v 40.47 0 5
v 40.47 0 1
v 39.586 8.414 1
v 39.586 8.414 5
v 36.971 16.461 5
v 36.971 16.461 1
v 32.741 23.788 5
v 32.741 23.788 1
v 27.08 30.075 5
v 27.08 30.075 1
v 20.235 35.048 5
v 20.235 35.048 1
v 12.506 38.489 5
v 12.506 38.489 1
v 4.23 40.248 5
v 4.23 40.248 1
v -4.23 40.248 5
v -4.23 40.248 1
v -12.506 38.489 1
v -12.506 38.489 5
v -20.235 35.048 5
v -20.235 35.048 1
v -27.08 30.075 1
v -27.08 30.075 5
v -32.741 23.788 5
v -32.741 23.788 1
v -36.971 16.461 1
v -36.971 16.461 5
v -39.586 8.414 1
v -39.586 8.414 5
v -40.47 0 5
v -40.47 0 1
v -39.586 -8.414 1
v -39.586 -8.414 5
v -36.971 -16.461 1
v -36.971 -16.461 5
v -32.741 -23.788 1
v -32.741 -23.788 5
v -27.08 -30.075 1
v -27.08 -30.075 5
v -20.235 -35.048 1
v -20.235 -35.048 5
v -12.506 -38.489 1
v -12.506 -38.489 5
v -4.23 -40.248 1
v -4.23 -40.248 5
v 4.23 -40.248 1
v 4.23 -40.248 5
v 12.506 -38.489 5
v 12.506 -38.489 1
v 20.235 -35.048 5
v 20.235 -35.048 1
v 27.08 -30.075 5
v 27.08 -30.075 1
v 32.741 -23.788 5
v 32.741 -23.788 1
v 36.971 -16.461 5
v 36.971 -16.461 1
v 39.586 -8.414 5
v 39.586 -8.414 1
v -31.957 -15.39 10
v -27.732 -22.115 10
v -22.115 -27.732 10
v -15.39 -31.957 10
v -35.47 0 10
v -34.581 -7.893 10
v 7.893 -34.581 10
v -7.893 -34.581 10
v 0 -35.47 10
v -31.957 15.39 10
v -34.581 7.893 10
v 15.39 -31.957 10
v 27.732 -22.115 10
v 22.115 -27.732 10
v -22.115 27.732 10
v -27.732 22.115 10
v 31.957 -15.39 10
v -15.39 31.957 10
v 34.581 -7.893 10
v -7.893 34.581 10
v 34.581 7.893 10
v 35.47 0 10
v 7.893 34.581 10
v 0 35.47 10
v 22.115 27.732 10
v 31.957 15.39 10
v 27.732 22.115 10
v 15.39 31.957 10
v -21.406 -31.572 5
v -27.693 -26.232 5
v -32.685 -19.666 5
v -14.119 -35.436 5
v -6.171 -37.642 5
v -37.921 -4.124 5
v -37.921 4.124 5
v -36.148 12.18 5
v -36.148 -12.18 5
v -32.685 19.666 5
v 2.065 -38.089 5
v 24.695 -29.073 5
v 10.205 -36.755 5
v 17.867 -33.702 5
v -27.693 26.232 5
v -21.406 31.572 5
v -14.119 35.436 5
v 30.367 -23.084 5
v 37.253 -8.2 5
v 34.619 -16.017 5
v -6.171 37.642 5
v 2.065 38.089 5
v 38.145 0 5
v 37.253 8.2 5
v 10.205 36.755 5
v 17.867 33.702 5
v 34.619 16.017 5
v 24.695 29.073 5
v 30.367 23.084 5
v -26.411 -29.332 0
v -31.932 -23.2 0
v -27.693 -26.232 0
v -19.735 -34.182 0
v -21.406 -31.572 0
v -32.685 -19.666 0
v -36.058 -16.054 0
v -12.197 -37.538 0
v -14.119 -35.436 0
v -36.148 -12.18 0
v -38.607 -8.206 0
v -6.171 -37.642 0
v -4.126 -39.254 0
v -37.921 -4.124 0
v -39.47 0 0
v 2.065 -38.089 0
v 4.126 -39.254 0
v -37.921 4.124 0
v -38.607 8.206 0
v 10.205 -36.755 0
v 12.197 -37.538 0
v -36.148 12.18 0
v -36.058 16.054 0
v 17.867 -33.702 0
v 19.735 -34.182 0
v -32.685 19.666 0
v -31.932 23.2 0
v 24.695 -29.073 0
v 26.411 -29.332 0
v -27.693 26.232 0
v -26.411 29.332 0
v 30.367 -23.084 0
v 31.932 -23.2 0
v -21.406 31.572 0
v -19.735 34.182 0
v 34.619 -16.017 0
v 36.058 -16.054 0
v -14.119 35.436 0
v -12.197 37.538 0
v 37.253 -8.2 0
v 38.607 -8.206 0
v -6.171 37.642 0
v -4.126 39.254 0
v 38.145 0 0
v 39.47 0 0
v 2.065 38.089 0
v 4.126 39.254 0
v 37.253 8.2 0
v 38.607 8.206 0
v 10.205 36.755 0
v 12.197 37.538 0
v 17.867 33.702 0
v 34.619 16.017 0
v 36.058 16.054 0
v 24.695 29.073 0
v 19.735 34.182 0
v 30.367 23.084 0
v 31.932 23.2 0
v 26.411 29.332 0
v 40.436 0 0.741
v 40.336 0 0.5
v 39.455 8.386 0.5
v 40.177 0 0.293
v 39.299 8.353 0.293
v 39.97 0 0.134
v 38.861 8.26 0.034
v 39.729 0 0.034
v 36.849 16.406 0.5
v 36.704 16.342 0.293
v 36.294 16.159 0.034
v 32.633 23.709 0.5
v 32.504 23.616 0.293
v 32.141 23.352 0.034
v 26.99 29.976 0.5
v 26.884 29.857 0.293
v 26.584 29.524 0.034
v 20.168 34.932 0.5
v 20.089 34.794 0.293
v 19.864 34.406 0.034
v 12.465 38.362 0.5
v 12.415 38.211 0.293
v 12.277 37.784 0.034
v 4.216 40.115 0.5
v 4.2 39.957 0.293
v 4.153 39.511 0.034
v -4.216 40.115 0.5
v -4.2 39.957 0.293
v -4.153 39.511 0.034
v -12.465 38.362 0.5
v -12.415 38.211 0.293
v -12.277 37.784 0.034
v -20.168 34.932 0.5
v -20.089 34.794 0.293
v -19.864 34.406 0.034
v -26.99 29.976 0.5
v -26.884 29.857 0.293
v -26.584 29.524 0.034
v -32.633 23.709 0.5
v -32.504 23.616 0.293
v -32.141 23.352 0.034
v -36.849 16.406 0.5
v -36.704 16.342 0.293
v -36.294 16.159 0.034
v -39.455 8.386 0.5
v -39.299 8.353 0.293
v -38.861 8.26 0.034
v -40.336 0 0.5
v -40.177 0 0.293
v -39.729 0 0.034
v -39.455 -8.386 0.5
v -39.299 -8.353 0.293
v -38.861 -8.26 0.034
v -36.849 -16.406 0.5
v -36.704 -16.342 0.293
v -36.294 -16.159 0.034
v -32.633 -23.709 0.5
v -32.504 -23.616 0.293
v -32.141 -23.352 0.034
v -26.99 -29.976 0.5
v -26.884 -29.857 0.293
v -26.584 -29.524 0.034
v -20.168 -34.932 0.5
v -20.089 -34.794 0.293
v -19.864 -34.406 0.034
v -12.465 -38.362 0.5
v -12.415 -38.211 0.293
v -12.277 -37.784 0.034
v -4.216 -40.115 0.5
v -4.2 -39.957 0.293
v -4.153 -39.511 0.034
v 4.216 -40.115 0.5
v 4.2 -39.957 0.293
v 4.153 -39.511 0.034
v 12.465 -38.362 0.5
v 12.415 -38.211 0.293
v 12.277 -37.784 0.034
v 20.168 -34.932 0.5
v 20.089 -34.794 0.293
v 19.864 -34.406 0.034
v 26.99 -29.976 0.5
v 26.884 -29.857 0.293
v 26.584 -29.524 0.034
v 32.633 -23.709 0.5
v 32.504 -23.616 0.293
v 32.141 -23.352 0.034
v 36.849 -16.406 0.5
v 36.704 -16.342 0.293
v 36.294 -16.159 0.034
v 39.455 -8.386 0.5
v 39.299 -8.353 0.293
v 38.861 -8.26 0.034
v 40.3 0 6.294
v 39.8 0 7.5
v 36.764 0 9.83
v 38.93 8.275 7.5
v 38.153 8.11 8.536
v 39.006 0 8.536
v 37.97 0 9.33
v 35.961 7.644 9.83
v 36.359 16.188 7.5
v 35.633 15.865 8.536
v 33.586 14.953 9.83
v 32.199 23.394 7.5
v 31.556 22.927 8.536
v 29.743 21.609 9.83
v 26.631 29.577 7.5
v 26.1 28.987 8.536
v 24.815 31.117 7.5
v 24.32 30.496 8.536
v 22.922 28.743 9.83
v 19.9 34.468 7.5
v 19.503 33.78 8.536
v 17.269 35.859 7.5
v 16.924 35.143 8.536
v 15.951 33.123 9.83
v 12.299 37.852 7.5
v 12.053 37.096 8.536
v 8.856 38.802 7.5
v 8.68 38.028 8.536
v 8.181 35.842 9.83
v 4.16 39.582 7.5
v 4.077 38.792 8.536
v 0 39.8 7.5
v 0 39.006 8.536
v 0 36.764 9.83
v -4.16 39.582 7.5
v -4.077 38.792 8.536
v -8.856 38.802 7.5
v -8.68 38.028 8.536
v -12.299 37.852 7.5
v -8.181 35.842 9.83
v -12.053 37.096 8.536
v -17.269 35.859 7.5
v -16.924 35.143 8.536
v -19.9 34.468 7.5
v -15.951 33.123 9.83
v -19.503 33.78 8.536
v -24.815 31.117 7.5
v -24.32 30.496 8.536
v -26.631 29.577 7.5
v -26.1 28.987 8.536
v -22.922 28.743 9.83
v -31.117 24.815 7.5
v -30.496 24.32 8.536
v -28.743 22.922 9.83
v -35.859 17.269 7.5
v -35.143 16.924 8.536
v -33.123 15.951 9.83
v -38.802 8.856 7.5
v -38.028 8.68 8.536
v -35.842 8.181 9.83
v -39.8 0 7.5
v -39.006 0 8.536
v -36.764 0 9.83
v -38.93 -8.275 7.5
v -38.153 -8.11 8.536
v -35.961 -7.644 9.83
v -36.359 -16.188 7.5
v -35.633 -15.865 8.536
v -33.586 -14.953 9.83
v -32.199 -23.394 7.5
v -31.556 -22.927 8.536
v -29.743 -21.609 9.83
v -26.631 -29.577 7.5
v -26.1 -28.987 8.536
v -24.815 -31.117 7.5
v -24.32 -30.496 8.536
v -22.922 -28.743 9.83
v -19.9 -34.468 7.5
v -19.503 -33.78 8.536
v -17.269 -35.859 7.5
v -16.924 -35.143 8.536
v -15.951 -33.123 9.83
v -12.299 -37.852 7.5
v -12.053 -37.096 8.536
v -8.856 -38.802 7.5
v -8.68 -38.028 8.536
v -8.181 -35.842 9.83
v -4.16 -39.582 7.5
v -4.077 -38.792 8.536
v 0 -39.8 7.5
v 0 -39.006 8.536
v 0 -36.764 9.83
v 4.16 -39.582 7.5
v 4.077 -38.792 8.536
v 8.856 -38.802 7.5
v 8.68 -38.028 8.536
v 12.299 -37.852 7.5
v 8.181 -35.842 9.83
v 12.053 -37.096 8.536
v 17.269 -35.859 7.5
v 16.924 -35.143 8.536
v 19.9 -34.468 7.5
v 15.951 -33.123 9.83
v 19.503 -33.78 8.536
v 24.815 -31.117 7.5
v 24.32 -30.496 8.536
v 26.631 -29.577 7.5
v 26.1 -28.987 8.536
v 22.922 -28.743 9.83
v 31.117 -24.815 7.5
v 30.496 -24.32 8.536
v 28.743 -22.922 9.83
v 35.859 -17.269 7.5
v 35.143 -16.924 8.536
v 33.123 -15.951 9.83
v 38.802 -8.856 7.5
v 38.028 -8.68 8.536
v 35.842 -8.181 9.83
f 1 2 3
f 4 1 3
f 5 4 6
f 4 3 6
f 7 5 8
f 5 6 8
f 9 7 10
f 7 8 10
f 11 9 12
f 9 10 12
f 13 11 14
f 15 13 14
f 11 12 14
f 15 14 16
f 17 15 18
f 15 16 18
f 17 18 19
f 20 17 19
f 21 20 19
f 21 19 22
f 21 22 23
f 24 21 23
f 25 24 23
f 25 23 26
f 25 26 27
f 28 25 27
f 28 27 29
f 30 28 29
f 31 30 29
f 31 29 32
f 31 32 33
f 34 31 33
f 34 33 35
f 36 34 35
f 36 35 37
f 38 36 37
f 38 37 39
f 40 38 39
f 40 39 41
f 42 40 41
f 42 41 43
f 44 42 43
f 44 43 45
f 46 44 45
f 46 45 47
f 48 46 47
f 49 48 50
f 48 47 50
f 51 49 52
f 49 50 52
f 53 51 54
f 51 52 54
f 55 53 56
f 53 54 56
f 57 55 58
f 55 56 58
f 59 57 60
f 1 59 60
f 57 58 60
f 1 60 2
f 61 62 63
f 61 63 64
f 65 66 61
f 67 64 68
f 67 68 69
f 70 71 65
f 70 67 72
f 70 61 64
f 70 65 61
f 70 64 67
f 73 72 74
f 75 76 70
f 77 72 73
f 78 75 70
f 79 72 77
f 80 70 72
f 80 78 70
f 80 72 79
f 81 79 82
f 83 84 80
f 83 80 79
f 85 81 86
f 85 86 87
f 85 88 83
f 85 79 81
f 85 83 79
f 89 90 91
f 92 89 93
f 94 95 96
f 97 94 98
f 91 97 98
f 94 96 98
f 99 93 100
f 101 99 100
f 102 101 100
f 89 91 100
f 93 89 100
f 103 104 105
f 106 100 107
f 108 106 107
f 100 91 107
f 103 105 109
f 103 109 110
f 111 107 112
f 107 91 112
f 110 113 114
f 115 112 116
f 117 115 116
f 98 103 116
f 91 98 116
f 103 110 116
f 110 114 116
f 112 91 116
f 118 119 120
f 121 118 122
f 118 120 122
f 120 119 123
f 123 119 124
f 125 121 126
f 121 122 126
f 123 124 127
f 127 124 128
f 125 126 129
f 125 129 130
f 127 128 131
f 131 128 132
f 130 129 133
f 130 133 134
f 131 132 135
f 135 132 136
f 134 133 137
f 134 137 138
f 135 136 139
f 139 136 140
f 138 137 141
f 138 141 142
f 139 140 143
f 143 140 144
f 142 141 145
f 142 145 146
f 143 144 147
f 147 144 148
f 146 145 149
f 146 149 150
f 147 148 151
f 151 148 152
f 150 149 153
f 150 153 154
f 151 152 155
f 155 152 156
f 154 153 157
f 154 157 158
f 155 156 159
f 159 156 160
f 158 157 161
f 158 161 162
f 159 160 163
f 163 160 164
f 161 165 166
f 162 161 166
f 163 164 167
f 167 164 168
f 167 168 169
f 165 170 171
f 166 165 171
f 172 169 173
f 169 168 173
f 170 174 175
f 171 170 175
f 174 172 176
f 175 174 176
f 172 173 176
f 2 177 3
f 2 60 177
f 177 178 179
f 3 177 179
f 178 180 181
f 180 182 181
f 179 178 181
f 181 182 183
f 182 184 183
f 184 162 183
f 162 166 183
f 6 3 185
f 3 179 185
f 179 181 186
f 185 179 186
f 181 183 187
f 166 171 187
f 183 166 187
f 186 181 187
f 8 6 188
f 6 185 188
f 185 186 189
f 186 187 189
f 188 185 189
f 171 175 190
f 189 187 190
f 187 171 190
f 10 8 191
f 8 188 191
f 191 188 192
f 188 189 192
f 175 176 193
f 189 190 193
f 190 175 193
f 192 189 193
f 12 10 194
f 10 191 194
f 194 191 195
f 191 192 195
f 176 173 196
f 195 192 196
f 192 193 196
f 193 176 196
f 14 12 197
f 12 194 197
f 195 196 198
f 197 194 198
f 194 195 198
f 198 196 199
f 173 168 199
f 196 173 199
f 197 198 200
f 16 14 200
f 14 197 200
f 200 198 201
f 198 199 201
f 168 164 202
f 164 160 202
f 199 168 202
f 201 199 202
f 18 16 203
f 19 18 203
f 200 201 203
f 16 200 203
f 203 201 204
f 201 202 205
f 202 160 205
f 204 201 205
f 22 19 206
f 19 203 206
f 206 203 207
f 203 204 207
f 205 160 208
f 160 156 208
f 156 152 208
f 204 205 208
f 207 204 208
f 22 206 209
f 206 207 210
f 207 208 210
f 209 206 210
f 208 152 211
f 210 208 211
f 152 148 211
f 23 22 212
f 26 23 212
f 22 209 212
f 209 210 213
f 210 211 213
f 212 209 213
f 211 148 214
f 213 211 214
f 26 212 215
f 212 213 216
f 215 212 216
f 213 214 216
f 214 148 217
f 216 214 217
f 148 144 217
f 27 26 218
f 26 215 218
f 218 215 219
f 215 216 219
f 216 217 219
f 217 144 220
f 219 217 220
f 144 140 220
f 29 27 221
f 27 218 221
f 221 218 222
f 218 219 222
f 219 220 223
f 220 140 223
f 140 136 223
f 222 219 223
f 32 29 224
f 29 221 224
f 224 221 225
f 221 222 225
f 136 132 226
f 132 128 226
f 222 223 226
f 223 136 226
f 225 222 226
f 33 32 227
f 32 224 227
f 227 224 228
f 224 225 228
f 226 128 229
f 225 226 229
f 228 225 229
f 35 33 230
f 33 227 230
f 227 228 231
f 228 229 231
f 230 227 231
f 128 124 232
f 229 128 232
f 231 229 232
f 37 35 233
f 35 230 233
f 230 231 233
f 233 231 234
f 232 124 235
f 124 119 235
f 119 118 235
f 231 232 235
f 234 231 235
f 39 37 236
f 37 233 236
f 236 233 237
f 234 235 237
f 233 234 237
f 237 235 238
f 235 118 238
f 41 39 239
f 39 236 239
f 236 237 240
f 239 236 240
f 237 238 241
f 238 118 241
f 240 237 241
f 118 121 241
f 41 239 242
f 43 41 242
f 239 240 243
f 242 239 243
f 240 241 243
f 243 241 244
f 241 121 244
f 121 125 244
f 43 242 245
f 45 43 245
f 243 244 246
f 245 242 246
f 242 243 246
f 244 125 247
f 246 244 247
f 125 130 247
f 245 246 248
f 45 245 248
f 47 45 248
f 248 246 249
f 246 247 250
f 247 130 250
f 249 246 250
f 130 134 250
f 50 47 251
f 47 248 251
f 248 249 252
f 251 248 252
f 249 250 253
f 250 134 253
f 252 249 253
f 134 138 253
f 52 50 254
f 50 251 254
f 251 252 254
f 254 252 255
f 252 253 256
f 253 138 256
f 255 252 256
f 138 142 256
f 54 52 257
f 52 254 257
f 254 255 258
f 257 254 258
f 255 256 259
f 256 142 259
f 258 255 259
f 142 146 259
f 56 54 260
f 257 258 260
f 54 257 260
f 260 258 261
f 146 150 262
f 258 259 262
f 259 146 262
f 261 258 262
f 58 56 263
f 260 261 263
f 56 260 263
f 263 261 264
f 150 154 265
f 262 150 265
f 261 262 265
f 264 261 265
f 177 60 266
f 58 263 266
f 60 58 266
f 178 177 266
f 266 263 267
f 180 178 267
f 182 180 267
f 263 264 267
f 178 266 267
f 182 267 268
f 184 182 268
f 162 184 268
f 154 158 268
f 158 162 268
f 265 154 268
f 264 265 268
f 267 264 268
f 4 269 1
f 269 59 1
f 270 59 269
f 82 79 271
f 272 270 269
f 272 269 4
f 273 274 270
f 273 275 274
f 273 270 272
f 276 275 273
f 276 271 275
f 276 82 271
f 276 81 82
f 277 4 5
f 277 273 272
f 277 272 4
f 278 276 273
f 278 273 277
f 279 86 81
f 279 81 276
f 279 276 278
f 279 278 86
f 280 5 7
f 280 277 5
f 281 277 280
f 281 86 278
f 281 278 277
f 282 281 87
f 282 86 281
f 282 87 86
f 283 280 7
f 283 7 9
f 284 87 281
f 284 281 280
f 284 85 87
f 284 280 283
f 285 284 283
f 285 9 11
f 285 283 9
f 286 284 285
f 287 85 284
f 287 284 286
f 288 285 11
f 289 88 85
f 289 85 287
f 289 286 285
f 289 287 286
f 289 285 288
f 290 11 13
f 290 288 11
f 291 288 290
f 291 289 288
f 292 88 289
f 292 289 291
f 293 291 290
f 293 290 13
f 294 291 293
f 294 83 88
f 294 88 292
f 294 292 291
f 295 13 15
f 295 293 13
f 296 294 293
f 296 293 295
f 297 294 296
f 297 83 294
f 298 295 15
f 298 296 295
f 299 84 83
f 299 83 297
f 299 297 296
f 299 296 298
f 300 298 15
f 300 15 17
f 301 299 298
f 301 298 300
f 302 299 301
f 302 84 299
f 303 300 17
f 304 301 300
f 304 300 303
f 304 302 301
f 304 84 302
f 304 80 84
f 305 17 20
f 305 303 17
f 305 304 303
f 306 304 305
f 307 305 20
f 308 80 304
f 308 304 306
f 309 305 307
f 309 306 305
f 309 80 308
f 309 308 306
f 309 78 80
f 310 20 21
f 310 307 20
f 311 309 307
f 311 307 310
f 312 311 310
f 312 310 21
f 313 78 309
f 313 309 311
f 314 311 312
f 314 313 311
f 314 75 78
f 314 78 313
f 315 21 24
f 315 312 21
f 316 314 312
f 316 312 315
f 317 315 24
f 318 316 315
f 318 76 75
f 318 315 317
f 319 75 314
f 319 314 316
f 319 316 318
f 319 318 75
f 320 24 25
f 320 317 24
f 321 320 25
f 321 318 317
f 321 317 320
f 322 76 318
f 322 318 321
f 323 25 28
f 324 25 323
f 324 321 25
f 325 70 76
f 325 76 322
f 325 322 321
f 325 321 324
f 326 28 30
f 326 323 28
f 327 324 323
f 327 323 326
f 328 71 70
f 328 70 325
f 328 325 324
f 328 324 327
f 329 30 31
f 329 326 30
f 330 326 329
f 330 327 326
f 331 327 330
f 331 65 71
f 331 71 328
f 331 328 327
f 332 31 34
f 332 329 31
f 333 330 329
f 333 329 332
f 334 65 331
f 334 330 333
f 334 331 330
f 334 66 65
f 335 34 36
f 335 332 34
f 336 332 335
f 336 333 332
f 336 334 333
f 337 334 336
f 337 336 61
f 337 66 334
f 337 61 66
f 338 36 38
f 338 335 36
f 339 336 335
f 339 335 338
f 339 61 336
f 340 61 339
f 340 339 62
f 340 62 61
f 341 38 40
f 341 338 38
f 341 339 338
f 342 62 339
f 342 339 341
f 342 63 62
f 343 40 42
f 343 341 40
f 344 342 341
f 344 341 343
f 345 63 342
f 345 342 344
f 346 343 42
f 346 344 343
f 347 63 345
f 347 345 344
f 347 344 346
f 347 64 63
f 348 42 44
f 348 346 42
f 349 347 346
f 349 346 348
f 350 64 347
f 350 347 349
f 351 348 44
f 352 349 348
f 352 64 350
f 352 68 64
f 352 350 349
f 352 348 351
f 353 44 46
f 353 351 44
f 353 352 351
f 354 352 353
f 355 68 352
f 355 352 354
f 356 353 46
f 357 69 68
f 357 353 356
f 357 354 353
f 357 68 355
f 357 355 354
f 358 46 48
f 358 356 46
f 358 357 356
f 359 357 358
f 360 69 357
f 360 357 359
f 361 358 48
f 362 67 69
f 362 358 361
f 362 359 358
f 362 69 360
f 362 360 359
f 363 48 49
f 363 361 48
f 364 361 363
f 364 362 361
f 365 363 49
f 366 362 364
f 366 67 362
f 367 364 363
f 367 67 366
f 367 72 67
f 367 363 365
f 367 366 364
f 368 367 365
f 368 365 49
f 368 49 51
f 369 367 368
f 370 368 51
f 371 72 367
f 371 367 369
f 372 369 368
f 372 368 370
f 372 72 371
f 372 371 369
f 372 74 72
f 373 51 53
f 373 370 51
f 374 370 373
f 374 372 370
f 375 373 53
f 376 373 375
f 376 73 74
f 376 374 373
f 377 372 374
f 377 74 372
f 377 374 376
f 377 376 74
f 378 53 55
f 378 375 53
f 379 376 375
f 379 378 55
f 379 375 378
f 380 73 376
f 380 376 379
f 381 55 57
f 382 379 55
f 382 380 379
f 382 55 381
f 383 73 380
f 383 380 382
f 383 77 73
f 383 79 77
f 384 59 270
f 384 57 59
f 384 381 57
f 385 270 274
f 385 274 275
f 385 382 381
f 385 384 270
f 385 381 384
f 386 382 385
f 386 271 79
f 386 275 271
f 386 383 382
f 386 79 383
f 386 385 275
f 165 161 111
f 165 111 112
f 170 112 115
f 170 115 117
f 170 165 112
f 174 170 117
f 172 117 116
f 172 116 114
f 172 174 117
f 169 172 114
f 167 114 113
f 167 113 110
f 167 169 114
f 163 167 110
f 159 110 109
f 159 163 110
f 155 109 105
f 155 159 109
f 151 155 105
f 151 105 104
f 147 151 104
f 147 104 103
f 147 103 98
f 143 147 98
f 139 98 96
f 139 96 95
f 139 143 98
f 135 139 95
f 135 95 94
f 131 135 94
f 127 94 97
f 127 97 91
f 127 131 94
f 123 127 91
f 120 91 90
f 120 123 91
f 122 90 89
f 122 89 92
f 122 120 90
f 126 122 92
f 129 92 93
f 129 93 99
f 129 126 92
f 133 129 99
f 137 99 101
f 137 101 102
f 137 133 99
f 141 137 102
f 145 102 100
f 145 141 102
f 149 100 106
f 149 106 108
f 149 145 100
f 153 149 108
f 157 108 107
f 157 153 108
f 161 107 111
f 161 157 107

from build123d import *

# Parameters (mm, degrees)
F0_R     = 40.47
F0_R_2   = 38.145
F1_DEPTH = 5
F2_R     = 40.47
F3_DEPTH = 5
F4_R     = 5
F5_R     = 1


with BuildPart() as f1:
    # F0 (on Top) → F1 (new body)
    with BuildSketch(Plane.XY):
        Circle(F0_R)
        Circle(F0_R_2, mode=Mode.SUBTRACT)
    extrude(amount=F1_DEPTH)

    # F2 (on face) → F3 (join)
    with BuildSketch(Plane.XY.offset(5)):
        Circle(F2_R)
    extrude(amount=F3_DEPTH)

    # F4
    f4_edges = [f1.edges().sort_by_distance(p)[0] for p in [
        (-40.47, 0, 10),
    ]]
    fillet(f4_edges, radius=F4_R)

    # F5
    f5_edges = [f1.edges().sort_by_distance(p)[0] for p in [
        (-40.47, 0, 0),
    ]]
    fillet(f5_edges, radius=F5_R)


solid = f1.part
